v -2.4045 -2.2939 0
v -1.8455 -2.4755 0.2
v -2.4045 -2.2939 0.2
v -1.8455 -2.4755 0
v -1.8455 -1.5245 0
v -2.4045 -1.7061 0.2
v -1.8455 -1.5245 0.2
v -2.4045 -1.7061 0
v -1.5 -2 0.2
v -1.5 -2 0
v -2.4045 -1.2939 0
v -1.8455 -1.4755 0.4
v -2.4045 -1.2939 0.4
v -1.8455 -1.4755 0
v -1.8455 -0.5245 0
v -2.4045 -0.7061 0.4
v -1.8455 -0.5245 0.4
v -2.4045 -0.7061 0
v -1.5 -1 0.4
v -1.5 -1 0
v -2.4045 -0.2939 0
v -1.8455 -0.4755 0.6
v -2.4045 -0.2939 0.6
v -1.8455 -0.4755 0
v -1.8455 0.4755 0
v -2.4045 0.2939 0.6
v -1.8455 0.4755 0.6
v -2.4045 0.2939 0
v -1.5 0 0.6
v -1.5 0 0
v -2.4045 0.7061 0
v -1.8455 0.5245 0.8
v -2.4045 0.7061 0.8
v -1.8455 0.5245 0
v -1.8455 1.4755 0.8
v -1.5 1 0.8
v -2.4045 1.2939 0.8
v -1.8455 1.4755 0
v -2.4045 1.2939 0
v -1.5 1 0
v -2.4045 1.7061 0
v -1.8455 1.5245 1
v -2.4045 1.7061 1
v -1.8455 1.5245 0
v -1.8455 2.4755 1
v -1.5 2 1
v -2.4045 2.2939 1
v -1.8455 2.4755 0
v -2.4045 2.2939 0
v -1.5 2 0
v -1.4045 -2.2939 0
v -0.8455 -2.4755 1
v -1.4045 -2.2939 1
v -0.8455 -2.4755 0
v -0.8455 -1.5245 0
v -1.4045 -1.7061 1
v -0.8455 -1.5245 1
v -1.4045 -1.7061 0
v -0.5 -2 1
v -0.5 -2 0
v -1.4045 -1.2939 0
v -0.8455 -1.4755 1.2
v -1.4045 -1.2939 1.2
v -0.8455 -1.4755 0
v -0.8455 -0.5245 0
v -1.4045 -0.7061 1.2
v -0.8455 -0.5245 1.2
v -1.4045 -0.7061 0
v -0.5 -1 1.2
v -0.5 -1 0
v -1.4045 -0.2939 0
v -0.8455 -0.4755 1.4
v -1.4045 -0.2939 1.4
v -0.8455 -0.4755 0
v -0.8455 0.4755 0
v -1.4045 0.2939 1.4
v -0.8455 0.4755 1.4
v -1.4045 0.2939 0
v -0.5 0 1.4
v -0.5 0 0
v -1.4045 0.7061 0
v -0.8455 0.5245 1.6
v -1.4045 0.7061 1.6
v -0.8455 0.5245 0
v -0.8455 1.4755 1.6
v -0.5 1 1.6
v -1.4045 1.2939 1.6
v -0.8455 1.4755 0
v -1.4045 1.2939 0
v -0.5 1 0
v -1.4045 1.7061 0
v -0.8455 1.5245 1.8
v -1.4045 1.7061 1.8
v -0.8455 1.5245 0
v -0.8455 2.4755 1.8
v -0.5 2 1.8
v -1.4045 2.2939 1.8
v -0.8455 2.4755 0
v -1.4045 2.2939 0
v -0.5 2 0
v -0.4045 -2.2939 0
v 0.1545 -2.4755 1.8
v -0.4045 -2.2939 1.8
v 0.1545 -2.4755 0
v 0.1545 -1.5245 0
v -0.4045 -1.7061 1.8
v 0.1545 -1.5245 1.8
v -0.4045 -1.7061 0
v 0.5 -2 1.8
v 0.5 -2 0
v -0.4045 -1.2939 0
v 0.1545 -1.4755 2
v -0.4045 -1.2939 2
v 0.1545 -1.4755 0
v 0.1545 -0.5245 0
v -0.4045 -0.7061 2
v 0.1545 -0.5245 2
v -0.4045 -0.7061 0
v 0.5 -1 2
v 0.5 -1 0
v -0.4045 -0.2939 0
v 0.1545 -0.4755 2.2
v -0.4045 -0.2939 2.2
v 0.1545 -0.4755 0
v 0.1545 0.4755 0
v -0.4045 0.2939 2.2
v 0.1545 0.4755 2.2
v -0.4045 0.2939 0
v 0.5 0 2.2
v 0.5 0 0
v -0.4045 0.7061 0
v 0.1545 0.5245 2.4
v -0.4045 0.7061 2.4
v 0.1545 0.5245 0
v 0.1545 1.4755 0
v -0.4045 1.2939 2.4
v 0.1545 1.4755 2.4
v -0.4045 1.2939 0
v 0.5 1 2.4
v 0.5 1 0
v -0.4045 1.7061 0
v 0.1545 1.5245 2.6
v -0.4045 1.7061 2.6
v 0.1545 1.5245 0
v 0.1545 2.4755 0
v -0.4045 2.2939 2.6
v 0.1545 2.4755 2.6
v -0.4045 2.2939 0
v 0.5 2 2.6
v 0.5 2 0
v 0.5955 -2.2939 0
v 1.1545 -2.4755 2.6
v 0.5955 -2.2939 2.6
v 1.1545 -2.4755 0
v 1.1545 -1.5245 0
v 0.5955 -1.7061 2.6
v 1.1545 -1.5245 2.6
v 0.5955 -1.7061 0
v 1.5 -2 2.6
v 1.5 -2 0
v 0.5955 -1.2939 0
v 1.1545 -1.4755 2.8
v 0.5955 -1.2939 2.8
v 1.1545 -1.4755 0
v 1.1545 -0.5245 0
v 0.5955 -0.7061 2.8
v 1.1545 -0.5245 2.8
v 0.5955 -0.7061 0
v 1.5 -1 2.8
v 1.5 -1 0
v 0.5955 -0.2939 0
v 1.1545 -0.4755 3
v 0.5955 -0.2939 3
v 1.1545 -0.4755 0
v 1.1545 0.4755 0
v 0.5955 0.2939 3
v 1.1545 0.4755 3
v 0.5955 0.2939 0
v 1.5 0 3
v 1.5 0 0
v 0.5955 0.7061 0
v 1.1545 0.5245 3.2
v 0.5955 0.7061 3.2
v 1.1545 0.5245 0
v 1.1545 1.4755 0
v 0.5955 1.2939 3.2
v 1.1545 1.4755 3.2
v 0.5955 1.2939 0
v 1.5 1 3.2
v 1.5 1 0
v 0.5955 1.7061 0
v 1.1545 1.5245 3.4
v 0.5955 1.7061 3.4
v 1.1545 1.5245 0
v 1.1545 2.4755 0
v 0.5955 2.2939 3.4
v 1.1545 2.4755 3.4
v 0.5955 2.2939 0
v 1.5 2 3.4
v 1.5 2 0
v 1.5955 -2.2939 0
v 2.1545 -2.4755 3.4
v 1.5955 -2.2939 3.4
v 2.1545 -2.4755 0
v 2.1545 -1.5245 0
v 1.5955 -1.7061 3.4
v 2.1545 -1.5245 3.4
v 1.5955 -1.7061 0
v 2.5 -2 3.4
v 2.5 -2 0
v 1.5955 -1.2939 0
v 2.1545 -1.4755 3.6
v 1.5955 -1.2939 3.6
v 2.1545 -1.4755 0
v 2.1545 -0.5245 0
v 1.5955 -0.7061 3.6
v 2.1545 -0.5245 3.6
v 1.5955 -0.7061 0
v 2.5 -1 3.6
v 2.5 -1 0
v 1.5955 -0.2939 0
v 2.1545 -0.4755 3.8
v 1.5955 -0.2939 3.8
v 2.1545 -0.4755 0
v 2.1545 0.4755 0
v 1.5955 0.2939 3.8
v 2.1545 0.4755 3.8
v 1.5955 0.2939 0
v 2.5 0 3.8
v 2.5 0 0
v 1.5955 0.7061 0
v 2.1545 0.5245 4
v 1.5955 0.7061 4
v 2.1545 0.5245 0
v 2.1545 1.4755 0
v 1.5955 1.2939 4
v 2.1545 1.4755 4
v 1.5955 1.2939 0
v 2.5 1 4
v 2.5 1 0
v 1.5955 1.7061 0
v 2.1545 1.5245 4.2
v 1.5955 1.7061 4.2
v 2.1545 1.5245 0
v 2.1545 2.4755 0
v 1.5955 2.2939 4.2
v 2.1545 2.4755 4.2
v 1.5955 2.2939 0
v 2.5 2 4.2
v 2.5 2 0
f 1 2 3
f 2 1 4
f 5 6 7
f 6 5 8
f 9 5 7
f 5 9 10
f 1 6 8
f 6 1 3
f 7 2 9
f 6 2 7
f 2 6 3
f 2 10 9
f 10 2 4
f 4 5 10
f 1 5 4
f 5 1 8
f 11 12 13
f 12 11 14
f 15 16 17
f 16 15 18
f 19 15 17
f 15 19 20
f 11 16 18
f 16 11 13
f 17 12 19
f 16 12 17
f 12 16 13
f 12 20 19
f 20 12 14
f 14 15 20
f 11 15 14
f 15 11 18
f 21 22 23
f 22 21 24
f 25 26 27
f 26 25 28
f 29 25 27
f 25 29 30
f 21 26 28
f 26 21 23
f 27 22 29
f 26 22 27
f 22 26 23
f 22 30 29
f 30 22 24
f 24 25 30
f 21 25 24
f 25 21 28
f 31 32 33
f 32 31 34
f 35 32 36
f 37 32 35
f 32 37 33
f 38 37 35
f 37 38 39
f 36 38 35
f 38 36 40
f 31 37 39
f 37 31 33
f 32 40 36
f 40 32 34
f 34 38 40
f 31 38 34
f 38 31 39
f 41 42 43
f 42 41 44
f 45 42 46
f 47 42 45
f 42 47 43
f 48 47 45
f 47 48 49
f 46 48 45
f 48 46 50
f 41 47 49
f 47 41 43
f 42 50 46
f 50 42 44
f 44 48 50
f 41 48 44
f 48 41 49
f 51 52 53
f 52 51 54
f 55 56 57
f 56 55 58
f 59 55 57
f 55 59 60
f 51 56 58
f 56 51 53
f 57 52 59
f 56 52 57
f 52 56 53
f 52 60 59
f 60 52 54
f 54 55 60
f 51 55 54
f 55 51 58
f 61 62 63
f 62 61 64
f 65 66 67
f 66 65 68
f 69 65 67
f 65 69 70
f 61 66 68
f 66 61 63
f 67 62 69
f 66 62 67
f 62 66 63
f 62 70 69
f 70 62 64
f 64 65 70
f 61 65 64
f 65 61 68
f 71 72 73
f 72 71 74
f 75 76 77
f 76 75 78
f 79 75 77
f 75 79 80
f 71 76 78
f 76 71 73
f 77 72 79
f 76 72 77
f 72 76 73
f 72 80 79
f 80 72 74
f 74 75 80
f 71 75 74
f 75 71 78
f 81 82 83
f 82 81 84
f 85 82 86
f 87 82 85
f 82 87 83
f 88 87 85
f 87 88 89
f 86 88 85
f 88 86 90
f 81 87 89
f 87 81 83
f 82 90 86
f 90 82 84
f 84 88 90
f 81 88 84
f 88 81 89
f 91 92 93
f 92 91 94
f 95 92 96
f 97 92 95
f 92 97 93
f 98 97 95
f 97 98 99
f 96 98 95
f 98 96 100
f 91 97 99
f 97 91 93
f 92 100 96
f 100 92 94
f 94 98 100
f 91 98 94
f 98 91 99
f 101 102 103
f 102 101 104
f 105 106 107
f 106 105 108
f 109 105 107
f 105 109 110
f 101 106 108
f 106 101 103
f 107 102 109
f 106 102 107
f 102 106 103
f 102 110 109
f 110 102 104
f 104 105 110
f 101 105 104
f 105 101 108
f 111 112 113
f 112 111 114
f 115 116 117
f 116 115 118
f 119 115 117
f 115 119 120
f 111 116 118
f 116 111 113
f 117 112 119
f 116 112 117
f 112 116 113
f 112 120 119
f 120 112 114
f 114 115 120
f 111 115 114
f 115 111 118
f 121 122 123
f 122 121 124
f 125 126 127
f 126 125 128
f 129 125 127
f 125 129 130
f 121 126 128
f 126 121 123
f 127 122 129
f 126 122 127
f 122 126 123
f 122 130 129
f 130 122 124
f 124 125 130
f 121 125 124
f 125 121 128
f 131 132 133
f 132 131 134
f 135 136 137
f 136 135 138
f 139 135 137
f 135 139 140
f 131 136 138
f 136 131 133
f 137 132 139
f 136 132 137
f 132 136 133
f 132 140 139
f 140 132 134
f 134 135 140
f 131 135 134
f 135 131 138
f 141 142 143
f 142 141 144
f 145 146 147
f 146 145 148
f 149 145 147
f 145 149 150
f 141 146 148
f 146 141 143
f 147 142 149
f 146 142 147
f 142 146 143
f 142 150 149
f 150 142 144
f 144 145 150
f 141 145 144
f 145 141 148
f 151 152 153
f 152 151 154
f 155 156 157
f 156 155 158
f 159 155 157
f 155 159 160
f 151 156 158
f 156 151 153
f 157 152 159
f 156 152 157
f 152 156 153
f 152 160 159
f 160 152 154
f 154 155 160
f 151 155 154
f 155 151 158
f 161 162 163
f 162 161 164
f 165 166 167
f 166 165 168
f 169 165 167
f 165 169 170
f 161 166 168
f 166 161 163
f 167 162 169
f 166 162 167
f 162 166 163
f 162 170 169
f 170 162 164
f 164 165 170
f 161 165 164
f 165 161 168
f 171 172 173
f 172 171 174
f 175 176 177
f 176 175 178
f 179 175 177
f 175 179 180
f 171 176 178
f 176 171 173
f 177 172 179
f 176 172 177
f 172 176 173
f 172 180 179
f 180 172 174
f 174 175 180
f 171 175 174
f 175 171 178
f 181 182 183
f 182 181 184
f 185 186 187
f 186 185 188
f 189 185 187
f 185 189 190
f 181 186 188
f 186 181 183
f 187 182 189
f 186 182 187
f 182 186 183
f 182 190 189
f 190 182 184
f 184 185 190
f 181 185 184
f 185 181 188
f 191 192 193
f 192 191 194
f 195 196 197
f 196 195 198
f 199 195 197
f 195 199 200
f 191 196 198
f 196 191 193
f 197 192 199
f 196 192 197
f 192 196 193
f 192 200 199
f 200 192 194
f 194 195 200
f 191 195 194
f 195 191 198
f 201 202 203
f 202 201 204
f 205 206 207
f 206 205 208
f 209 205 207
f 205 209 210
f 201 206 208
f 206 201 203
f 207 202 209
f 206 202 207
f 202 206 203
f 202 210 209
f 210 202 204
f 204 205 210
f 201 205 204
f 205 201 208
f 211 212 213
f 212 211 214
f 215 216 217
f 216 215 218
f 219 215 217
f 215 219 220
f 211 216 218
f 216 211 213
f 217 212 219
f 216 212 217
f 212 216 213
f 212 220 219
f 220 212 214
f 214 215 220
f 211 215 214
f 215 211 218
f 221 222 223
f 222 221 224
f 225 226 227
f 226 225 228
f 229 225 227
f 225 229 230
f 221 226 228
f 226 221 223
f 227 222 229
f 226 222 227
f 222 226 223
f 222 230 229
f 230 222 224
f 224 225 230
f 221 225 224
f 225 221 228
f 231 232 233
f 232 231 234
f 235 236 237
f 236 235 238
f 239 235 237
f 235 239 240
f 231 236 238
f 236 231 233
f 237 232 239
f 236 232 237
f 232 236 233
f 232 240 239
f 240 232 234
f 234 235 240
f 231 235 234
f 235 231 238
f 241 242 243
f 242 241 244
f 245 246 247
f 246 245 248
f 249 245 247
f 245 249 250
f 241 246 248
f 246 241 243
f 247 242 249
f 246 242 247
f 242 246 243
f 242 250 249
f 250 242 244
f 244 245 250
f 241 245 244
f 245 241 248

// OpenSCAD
x = -3;
y = 2;
z = 4;
array=[for (i = [0 : 1 : 4]) i];
h_cylinders = [for (i = [0.2 : 0.2 : 5]) i];
//[for (i = [r0 : dr: rf]) i];

/*for(i=[x:y:z])
    for(j=[x:y:z])
        for(k=[0:1:15])
            {translate([i,j,k*3])
             cylinders(h_cylinders[k]);
                }
*/        
    

for(i=[0:1:4])
    for(j=[0:1:4])
    {translate([i-2, j-2, 0])cylinders(h_cylinders[4*i+j]);}


module cylinders(h) {
    color("blue")
    translate([0,0,0]) cylinder(h = h, r = .5);
    
}
/*for (i = [0:1:15]) {
    translate([i,i,i])
cylinders(h_cylinders[i]);
}*/
